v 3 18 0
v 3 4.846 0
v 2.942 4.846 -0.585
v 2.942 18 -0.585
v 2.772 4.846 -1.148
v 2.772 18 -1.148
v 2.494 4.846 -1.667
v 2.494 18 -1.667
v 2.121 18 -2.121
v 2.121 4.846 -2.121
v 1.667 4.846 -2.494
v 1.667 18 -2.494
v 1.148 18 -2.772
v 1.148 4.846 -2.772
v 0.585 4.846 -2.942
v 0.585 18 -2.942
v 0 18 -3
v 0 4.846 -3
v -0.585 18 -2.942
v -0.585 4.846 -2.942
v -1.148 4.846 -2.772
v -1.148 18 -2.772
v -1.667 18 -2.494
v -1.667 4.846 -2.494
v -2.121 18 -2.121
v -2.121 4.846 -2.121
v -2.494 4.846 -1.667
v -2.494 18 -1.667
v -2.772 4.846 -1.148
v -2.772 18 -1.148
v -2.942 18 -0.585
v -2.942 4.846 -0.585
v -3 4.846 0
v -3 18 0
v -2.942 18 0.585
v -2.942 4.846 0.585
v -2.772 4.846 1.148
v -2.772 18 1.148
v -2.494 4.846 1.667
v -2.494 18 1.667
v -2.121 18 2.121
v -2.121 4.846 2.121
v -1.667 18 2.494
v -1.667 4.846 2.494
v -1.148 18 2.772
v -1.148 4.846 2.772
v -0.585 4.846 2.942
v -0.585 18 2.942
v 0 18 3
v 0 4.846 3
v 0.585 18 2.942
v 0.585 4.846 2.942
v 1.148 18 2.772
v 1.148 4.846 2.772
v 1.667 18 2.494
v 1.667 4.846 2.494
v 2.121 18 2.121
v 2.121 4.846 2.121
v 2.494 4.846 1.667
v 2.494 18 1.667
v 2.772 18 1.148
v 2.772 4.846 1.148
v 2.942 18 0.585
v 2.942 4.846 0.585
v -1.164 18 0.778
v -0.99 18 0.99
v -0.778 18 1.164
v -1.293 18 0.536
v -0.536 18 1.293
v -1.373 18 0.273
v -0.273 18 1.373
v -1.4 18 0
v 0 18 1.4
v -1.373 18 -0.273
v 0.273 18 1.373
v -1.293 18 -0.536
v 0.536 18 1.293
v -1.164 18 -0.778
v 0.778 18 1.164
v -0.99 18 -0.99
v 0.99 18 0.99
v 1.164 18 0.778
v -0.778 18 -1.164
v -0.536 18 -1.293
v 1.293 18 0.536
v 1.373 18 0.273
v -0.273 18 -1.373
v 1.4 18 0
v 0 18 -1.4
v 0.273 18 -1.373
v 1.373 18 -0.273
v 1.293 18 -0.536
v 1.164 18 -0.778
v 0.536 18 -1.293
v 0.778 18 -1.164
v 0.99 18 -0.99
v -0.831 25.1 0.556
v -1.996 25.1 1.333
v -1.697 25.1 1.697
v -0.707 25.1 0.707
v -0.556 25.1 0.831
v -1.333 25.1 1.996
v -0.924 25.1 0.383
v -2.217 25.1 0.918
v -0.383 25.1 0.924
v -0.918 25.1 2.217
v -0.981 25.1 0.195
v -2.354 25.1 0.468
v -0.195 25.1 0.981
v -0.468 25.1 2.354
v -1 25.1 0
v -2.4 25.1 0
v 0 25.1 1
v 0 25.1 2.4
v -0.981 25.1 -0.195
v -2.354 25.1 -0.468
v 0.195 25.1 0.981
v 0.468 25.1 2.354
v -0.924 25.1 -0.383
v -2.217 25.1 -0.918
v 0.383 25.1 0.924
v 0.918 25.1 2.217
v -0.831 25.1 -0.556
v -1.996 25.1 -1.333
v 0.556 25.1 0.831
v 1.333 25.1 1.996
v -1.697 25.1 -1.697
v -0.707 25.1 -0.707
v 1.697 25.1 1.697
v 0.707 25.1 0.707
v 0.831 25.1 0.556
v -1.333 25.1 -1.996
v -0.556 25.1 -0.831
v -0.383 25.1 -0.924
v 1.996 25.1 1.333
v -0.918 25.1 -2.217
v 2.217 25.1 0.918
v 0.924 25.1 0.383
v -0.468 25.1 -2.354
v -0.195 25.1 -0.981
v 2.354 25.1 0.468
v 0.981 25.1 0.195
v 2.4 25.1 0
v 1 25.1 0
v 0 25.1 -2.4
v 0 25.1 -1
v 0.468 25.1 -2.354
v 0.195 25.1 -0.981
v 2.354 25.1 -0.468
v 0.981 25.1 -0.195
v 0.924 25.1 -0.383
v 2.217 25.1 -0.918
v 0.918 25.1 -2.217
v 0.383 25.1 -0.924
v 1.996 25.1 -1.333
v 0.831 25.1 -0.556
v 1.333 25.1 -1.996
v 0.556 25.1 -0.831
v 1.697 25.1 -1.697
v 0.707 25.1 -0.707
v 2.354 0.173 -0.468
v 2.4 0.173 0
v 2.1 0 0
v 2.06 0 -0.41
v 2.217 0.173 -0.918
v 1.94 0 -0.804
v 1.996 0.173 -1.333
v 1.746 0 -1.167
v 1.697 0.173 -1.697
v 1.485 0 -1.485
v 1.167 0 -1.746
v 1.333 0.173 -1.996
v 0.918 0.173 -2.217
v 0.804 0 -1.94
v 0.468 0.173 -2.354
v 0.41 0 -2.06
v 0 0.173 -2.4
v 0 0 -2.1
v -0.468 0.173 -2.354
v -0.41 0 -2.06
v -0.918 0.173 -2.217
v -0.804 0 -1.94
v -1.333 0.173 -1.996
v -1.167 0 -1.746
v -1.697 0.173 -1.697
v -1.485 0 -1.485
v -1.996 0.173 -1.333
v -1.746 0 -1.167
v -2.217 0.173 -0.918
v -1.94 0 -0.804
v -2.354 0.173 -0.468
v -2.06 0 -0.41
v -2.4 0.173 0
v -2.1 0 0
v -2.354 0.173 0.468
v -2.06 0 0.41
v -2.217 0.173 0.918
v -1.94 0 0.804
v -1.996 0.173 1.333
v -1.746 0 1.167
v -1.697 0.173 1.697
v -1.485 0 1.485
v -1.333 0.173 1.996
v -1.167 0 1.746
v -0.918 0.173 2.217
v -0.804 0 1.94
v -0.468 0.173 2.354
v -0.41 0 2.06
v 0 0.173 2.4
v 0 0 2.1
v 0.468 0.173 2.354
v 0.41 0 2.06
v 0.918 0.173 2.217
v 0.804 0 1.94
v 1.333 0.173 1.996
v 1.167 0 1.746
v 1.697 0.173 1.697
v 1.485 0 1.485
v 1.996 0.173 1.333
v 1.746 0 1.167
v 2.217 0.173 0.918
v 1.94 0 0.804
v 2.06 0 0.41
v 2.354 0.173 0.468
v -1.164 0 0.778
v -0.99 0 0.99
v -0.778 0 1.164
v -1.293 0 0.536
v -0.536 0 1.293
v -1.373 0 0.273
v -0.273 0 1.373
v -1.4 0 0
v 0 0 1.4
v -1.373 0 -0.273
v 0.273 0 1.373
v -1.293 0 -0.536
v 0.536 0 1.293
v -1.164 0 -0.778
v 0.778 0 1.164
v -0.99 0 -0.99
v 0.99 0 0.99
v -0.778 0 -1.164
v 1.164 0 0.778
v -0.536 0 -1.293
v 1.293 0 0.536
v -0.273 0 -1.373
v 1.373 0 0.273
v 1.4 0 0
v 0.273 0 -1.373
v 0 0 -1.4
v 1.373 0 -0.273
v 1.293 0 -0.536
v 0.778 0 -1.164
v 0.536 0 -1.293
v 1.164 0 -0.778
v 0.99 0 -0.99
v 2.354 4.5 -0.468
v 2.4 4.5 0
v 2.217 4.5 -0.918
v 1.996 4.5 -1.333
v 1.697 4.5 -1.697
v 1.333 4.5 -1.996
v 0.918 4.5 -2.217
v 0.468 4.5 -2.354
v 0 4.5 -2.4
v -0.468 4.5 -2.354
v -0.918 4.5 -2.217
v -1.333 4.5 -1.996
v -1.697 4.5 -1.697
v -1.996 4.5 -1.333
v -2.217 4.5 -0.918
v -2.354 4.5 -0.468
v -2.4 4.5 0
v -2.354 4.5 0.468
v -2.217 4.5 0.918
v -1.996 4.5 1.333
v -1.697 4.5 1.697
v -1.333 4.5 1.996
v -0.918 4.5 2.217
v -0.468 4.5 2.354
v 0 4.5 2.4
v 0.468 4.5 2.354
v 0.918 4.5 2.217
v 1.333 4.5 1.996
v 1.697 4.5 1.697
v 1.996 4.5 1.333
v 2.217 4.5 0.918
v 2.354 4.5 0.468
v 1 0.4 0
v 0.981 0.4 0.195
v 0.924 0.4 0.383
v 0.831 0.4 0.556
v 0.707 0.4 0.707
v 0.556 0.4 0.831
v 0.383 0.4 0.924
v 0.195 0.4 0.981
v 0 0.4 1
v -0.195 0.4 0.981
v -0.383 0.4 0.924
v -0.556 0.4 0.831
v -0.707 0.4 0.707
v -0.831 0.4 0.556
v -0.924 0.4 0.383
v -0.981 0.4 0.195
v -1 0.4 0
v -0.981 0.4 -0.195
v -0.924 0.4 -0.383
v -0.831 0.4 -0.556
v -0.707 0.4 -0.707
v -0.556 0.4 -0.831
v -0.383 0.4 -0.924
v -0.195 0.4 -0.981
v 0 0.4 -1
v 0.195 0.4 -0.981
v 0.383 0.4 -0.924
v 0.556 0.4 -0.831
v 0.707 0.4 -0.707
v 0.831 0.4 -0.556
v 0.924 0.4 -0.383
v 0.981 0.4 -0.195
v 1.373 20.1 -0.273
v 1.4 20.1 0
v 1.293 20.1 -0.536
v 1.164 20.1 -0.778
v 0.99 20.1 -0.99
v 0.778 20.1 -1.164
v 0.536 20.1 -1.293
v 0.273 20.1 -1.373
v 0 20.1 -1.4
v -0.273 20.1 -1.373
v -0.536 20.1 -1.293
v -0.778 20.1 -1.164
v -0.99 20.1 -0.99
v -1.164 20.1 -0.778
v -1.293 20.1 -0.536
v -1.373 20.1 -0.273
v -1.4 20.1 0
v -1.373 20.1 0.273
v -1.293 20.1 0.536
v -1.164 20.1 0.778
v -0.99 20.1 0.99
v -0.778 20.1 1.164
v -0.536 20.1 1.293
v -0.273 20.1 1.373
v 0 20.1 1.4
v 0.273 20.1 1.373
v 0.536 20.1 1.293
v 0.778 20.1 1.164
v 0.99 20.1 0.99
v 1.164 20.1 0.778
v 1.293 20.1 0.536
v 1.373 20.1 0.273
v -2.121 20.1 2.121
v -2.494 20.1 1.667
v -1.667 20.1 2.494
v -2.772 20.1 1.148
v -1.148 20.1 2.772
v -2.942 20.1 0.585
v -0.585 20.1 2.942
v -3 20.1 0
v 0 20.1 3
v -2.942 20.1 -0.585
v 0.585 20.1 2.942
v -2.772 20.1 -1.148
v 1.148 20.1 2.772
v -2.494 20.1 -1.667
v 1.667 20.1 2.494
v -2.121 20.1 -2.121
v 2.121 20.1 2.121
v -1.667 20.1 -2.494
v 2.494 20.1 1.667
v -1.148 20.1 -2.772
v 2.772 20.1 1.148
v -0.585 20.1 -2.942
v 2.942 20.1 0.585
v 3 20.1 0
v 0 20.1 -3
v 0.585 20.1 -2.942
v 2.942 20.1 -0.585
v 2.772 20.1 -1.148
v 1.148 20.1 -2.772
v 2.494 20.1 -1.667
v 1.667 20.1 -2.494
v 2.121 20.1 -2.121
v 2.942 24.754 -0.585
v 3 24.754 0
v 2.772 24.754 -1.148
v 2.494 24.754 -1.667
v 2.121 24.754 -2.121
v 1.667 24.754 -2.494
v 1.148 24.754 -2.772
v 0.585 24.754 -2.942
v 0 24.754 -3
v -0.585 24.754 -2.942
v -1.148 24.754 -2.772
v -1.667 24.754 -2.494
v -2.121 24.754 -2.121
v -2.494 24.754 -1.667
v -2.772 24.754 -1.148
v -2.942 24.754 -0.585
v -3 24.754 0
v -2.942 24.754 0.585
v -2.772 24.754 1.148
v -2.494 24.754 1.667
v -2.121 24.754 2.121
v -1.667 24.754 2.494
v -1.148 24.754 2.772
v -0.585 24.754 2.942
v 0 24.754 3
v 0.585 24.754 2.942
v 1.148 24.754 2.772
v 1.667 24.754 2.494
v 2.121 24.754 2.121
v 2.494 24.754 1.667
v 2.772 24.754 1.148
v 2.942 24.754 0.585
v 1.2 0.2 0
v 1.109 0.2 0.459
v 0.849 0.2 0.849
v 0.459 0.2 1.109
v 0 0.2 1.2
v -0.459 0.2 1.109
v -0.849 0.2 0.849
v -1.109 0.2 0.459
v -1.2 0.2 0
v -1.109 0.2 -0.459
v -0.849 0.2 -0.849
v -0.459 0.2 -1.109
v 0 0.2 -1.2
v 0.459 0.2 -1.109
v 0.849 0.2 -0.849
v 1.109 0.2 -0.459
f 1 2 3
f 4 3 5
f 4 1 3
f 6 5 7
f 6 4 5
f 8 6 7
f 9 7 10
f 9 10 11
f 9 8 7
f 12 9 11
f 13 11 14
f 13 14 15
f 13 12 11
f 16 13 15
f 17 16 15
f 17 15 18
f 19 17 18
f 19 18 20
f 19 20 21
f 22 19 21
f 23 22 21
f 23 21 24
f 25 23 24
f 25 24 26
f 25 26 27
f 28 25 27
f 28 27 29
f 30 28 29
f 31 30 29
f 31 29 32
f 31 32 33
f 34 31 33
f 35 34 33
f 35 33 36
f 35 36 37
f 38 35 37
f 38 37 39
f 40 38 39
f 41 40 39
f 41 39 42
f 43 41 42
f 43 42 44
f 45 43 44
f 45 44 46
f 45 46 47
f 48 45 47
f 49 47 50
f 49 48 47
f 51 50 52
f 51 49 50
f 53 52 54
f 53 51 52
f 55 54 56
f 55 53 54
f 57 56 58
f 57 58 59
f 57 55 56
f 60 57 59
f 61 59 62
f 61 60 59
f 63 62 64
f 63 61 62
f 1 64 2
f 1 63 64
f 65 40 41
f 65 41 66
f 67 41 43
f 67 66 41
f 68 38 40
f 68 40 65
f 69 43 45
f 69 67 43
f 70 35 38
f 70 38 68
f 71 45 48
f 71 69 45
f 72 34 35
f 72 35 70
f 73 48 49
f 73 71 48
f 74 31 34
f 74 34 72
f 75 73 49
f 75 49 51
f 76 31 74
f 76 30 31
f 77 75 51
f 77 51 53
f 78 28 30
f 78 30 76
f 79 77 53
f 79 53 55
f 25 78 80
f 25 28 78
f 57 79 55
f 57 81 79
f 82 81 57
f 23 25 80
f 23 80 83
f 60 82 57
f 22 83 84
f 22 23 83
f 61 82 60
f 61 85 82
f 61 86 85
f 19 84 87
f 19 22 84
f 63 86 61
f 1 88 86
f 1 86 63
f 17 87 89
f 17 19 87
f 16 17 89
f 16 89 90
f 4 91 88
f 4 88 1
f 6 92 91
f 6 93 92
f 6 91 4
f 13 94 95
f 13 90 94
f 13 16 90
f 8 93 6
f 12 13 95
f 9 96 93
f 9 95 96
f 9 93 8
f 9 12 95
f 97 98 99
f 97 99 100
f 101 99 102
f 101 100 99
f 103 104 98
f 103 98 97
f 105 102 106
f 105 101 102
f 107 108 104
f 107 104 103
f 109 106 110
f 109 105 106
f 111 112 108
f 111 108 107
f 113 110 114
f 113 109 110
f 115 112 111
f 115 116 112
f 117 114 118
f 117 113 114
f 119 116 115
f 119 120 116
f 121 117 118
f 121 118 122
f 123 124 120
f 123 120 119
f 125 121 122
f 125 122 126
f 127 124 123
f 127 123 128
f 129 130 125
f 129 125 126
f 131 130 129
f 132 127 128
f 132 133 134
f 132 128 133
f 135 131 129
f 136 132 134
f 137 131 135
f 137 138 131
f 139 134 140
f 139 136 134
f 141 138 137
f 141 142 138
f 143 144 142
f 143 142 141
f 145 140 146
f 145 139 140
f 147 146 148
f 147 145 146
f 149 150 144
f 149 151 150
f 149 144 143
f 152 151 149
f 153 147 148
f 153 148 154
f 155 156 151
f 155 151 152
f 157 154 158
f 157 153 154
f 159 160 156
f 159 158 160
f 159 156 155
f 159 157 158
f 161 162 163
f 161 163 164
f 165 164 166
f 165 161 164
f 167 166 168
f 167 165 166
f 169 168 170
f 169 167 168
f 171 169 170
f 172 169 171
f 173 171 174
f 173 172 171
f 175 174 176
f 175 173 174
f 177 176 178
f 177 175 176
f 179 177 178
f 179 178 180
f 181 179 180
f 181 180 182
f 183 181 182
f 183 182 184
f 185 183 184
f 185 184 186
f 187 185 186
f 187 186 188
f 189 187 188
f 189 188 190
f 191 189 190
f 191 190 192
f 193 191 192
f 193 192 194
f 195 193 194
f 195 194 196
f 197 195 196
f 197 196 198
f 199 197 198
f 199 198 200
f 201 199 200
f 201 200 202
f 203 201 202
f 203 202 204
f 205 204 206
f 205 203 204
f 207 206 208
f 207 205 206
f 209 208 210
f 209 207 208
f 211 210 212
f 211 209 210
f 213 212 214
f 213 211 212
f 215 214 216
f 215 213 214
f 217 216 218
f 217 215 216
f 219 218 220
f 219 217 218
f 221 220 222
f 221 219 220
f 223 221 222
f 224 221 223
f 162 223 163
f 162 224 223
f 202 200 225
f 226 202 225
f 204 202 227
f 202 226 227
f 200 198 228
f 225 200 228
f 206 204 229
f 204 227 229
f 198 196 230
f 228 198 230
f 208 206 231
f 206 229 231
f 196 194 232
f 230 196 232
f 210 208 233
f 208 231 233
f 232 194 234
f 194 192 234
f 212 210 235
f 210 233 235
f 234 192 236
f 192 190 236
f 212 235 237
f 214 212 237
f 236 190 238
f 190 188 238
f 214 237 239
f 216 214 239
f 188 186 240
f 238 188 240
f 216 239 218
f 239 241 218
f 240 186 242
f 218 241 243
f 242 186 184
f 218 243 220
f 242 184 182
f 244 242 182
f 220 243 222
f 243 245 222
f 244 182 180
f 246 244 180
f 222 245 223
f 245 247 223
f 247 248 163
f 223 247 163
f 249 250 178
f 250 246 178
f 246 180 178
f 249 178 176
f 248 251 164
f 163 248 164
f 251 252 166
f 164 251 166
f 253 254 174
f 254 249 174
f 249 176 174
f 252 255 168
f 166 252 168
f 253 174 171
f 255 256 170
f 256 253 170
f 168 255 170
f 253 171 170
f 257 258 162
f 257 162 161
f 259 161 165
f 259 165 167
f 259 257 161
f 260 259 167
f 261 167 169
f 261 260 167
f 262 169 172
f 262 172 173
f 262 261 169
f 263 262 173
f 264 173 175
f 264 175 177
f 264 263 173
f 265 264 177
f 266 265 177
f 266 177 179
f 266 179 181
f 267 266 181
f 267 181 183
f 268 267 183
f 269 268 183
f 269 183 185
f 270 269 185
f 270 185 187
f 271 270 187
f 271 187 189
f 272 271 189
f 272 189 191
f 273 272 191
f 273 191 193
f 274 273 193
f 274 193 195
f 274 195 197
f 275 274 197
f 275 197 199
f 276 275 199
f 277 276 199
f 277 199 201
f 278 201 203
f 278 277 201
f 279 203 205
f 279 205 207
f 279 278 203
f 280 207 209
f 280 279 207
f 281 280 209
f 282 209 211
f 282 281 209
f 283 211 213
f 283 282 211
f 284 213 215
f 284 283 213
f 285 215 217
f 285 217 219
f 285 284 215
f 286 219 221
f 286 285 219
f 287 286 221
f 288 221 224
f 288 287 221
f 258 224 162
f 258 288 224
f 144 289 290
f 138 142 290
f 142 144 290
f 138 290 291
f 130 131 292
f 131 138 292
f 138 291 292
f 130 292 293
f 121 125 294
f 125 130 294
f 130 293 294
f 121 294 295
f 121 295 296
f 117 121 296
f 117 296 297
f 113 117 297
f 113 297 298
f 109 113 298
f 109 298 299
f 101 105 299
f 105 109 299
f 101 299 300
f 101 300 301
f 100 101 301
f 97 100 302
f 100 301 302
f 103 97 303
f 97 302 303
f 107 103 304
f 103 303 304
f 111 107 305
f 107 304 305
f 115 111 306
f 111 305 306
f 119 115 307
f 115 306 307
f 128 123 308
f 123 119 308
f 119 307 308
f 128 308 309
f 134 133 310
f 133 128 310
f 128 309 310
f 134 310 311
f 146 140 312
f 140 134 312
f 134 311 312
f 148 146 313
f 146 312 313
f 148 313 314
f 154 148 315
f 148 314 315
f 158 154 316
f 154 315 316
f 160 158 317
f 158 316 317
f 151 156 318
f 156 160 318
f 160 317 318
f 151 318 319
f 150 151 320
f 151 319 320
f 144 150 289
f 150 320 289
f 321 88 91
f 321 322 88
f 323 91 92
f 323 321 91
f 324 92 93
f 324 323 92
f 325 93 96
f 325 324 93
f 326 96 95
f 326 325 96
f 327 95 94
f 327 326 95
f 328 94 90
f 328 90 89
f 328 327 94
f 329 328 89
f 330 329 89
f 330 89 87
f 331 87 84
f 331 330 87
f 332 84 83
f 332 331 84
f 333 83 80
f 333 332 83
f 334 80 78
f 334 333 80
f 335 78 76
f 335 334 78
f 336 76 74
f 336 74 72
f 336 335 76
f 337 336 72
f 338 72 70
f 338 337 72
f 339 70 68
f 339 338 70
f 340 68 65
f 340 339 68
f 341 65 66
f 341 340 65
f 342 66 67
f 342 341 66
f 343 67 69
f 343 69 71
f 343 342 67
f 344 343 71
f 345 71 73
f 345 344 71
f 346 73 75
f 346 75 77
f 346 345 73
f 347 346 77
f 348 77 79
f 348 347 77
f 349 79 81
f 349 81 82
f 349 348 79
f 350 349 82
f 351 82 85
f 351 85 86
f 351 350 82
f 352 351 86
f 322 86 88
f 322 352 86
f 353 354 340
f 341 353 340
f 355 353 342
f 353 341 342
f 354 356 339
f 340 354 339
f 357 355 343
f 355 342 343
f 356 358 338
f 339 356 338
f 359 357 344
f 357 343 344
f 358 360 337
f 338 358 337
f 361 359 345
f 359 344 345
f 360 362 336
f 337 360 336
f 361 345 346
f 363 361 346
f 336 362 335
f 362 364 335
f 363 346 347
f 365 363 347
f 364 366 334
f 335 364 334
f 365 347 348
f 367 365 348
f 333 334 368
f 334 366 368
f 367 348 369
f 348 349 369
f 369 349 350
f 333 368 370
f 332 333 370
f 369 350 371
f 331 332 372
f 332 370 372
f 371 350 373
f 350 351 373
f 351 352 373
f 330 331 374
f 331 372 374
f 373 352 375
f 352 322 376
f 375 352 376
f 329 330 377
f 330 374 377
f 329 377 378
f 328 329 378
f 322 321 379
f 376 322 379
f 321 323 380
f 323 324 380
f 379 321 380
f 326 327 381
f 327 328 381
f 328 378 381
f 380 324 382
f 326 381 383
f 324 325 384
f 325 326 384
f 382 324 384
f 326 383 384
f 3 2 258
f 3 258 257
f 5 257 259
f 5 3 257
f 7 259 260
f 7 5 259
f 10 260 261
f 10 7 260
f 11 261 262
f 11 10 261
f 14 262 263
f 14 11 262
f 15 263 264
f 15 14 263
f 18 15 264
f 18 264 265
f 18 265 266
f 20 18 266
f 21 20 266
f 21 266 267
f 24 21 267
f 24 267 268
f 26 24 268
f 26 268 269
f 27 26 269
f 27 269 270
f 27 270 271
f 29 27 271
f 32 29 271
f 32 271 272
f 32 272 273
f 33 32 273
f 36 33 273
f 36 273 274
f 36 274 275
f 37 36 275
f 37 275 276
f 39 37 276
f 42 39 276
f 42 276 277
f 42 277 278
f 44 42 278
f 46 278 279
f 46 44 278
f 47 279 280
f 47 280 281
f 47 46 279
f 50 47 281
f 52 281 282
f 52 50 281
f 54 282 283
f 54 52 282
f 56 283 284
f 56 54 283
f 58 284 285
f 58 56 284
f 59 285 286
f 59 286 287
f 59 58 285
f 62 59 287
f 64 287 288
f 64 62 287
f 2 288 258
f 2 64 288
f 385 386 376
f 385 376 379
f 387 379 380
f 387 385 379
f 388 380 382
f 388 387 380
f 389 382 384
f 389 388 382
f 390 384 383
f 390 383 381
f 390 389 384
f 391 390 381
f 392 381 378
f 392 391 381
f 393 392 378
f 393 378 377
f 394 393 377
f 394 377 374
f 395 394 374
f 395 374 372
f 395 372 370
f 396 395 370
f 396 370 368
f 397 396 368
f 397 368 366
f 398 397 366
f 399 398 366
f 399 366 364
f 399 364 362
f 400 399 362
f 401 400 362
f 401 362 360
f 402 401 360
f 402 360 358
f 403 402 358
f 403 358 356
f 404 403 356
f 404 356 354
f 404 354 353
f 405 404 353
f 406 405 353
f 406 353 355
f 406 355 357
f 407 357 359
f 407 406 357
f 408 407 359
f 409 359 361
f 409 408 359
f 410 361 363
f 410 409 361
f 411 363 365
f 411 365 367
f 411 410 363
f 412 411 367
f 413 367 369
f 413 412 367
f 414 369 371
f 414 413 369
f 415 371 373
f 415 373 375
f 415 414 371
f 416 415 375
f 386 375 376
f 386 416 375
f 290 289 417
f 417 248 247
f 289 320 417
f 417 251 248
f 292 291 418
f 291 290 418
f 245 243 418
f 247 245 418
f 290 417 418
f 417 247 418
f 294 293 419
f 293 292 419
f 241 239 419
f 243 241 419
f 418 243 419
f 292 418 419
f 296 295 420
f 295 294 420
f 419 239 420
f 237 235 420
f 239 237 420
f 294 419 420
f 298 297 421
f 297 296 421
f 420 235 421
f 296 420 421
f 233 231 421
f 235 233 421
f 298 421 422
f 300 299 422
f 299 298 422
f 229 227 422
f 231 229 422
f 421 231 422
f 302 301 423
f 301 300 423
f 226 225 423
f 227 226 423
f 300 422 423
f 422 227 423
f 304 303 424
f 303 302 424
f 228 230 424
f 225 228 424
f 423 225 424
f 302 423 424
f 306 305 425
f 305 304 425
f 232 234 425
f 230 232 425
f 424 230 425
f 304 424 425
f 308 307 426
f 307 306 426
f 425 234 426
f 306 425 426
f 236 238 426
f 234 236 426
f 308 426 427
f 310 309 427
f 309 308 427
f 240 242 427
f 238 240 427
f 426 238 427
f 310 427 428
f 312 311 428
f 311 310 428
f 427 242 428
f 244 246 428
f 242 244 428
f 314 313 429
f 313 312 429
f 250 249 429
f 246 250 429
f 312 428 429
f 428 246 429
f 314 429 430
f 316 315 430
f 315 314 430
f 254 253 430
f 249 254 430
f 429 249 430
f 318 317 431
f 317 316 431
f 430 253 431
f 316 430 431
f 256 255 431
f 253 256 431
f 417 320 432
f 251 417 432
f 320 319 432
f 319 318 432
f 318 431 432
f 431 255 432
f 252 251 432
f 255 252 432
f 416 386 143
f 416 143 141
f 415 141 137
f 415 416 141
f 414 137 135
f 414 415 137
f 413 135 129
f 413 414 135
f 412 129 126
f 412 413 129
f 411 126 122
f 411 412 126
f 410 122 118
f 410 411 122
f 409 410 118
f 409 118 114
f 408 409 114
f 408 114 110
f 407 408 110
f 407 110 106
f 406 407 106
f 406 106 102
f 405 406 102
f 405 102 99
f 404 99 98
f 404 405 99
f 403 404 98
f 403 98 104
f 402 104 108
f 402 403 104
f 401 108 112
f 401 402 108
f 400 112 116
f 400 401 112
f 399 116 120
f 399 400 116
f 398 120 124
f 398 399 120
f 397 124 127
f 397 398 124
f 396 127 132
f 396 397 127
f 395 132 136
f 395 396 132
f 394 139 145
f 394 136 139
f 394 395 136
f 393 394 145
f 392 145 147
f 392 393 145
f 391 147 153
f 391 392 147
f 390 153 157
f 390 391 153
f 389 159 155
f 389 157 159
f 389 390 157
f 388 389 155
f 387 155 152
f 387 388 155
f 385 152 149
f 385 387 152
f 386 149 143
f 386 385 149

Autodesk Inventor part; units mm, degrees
ref_plane "YZ Plane" through (0, 0, 0) normal (1, 0, 0) x (0, 1, 0)
ref_plane "XZ Plane" through (0, 0, 0) normal (0, 1, 0) x (-1, 0, 0)
ref_plane "XY Plane" through (0, 0, 0) normal (0, 0, 1) x (1, 0, 0)
sketch "Sketch1" plane through (0, 0, 0) normal (0, 0, 1) x (1, 0, 0)
  line L0 (0, 0) -> (0, 10.7581)
  line L1 (1.4, 0) -> (2.1, 0)
  line L2 (2.1, 0) -> (2.4, 0.1732)
  line L3 (2.4, 0.1732) -> (2.4, 4.5)
  line L4 (2.4, 4.5) -> (3, 4.8464)
  line L5 (3, 4.8464) -> (3, 18)
  line L6 (3, 18) -> (1.4, 18)
  line L7 (1.4, 18) -> (1.4, 20.1)
  line L8 (1.4, 20.1) -> (3, 20.1)
  line L9 (3, 20.1) -> (3, 24.7536)
  line L10 (3, 24.7536) -> (2.4, 25.1)
  line L11 (2.4, 25.1) -> (1, 25.1)
  line L12 (1, 25.1) -> (1, 0.4)
  line L13 (1, 0.4) -> (1.4, 0)
  dimension "d0" = 2
  dimension "d1" = 0.4
  dimension "d2" = 0.4
  dimension "d3" = 0.4
  dimension "d4" = 25.1
  dimension "d5" = 20.6
  dimension "d6" = 2.1
  dimension "d7" = 30
  dimension "d8" = 4.2
  dimension "d9" = 4.8
  dimension "d10" = 5
  dimension "d12" = 30
  dimension "d13" = 6
revolve "Revolution1" add sketch "Sketch1" angle 360 about axis through (0, 0, 0) along (0, 1, 0)
thread "Thread1" size "M6x1" class "6g" standard "ANSI Metric M Profile" full length
thread "Thread2" size "M6x1" class "6g" standard "ANSI Metric M Profile" full length
equation "\"d3\" = d2"
properties part number "E3D_Heat_Break"
